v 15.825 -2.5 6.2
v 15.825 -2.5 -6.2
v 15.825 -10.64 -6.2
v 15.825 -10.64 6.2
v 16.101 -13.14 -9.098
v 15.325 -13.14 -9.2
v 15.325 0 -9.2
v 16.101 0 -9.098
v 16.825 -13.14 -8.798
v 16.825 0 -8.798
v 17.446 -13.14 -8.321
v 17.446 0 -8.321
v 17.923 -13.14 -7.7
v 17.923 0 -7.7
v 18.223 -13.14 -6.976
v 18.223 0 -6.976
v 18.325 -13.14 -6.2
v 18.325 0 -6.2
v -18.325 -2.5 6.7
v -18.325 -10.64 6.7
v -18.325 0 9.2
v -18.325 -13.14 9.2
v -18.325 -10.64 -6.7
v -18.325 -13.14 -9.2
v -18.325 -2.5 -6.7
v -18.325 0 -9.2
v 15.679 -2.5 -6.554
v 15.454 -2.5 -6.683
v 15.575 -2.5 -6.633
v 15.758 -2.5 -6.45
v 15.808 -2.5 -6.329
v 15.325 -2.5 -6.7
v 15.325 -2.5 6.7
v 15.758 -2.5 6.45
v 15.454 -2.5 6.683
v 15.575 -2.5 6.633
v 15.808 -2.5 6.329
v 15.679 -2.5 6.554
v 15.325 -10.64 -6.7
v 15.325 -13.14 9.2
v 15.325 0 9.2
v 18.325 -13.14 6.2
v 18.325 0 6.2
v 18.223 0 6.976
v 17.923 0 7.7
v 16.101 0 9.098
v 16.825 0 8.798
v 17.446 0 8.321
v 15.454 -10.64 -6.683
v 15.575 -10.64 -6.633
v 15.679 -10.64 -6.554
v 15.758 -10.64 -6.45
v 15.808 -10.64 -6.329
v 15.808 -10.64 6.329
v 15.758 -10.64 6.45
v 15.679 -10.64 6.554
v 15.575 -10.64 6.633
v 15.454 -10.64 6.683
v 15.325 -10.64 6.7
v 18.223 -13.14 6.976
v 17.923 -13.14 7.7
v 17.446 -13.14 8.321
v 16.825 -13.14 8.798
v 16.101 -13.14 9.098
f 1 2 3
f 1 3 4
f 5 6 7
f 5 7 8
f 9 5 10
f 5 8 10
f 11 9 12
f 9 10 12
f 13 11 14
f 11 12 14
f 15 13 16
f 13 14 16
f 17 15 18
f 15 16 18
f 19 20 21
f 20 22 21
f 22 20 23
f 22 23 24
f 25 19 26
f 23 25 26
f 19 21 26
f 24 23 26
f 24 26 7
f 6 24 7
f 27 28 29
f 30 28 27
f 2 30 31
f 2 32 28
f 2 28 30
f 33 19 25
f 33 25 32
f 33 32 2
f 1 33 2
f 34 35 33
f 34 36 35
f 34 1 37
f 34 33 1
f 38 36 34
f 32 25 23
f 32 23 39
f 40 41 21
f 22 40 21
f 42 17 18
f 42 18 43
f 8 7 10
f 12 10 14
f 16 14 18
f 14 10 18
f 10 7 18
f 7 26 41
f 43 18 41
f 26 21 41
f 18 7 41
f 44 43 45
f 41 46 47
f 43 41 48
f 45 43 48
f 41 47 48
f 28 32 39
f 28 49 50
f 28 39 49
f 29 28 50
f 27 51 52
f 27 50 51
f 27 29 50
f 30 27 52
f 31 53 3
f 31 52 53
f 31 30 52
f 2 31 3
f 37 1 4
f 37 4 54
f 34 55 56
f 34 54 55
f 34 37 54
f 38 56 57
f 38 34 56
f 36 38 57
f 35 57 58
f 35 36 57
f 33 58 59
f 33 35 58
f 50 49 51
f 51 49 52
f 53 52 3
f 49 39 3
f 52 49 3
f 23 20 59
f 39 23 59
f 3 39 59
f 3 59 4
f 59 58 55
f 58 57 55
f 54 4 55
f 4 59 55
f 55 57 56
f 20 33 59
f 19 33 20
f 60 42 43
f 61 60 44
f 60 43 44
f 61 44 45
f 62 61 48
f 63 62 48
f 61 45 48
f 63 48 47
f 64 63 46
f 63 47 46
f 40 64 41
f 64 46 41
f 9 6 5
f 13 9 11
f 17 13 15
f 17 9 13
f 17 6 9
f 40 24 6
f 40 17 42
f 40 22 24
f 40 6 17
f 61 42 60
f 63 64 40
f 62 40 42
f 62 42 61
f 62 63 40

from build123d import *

# Parameters (mm, degrees)
F1_DEPTH = 13.14
F2_T     = -2.5


with BuildPart() as f1:
    # F0 (on Front) → F1 (new body)
    with BuildSketch(Plane.XZ):
        with BuildLine():
            Line((-18.325, -9.2), (15.325, -9.2))
            ThreePointArc((15.325, -9.2), (17.44632, -8.32132), (18.325, -6.2))
            Line((18.325, -6.2), (18.325, 6.2))
            ThreePointArc((18.325, 6.2), (17.44632, 8.32132), (15.325, 9.2))
            Line((15.325, 9.2), (-18.325, 9.2))
            Line((-18.325, 9.2), (-18.325, -9.2))
        make_face()
    extrude(amount=F1_DEPTH)

    # F2
    f2_openings = [f1.faces().sort_by_distance(p)[0] for p in [
        (-18.325, -6.57, 0),
    ]]
    offset(amount=F2_T, openings=f2_openings)


solid = f1.part
